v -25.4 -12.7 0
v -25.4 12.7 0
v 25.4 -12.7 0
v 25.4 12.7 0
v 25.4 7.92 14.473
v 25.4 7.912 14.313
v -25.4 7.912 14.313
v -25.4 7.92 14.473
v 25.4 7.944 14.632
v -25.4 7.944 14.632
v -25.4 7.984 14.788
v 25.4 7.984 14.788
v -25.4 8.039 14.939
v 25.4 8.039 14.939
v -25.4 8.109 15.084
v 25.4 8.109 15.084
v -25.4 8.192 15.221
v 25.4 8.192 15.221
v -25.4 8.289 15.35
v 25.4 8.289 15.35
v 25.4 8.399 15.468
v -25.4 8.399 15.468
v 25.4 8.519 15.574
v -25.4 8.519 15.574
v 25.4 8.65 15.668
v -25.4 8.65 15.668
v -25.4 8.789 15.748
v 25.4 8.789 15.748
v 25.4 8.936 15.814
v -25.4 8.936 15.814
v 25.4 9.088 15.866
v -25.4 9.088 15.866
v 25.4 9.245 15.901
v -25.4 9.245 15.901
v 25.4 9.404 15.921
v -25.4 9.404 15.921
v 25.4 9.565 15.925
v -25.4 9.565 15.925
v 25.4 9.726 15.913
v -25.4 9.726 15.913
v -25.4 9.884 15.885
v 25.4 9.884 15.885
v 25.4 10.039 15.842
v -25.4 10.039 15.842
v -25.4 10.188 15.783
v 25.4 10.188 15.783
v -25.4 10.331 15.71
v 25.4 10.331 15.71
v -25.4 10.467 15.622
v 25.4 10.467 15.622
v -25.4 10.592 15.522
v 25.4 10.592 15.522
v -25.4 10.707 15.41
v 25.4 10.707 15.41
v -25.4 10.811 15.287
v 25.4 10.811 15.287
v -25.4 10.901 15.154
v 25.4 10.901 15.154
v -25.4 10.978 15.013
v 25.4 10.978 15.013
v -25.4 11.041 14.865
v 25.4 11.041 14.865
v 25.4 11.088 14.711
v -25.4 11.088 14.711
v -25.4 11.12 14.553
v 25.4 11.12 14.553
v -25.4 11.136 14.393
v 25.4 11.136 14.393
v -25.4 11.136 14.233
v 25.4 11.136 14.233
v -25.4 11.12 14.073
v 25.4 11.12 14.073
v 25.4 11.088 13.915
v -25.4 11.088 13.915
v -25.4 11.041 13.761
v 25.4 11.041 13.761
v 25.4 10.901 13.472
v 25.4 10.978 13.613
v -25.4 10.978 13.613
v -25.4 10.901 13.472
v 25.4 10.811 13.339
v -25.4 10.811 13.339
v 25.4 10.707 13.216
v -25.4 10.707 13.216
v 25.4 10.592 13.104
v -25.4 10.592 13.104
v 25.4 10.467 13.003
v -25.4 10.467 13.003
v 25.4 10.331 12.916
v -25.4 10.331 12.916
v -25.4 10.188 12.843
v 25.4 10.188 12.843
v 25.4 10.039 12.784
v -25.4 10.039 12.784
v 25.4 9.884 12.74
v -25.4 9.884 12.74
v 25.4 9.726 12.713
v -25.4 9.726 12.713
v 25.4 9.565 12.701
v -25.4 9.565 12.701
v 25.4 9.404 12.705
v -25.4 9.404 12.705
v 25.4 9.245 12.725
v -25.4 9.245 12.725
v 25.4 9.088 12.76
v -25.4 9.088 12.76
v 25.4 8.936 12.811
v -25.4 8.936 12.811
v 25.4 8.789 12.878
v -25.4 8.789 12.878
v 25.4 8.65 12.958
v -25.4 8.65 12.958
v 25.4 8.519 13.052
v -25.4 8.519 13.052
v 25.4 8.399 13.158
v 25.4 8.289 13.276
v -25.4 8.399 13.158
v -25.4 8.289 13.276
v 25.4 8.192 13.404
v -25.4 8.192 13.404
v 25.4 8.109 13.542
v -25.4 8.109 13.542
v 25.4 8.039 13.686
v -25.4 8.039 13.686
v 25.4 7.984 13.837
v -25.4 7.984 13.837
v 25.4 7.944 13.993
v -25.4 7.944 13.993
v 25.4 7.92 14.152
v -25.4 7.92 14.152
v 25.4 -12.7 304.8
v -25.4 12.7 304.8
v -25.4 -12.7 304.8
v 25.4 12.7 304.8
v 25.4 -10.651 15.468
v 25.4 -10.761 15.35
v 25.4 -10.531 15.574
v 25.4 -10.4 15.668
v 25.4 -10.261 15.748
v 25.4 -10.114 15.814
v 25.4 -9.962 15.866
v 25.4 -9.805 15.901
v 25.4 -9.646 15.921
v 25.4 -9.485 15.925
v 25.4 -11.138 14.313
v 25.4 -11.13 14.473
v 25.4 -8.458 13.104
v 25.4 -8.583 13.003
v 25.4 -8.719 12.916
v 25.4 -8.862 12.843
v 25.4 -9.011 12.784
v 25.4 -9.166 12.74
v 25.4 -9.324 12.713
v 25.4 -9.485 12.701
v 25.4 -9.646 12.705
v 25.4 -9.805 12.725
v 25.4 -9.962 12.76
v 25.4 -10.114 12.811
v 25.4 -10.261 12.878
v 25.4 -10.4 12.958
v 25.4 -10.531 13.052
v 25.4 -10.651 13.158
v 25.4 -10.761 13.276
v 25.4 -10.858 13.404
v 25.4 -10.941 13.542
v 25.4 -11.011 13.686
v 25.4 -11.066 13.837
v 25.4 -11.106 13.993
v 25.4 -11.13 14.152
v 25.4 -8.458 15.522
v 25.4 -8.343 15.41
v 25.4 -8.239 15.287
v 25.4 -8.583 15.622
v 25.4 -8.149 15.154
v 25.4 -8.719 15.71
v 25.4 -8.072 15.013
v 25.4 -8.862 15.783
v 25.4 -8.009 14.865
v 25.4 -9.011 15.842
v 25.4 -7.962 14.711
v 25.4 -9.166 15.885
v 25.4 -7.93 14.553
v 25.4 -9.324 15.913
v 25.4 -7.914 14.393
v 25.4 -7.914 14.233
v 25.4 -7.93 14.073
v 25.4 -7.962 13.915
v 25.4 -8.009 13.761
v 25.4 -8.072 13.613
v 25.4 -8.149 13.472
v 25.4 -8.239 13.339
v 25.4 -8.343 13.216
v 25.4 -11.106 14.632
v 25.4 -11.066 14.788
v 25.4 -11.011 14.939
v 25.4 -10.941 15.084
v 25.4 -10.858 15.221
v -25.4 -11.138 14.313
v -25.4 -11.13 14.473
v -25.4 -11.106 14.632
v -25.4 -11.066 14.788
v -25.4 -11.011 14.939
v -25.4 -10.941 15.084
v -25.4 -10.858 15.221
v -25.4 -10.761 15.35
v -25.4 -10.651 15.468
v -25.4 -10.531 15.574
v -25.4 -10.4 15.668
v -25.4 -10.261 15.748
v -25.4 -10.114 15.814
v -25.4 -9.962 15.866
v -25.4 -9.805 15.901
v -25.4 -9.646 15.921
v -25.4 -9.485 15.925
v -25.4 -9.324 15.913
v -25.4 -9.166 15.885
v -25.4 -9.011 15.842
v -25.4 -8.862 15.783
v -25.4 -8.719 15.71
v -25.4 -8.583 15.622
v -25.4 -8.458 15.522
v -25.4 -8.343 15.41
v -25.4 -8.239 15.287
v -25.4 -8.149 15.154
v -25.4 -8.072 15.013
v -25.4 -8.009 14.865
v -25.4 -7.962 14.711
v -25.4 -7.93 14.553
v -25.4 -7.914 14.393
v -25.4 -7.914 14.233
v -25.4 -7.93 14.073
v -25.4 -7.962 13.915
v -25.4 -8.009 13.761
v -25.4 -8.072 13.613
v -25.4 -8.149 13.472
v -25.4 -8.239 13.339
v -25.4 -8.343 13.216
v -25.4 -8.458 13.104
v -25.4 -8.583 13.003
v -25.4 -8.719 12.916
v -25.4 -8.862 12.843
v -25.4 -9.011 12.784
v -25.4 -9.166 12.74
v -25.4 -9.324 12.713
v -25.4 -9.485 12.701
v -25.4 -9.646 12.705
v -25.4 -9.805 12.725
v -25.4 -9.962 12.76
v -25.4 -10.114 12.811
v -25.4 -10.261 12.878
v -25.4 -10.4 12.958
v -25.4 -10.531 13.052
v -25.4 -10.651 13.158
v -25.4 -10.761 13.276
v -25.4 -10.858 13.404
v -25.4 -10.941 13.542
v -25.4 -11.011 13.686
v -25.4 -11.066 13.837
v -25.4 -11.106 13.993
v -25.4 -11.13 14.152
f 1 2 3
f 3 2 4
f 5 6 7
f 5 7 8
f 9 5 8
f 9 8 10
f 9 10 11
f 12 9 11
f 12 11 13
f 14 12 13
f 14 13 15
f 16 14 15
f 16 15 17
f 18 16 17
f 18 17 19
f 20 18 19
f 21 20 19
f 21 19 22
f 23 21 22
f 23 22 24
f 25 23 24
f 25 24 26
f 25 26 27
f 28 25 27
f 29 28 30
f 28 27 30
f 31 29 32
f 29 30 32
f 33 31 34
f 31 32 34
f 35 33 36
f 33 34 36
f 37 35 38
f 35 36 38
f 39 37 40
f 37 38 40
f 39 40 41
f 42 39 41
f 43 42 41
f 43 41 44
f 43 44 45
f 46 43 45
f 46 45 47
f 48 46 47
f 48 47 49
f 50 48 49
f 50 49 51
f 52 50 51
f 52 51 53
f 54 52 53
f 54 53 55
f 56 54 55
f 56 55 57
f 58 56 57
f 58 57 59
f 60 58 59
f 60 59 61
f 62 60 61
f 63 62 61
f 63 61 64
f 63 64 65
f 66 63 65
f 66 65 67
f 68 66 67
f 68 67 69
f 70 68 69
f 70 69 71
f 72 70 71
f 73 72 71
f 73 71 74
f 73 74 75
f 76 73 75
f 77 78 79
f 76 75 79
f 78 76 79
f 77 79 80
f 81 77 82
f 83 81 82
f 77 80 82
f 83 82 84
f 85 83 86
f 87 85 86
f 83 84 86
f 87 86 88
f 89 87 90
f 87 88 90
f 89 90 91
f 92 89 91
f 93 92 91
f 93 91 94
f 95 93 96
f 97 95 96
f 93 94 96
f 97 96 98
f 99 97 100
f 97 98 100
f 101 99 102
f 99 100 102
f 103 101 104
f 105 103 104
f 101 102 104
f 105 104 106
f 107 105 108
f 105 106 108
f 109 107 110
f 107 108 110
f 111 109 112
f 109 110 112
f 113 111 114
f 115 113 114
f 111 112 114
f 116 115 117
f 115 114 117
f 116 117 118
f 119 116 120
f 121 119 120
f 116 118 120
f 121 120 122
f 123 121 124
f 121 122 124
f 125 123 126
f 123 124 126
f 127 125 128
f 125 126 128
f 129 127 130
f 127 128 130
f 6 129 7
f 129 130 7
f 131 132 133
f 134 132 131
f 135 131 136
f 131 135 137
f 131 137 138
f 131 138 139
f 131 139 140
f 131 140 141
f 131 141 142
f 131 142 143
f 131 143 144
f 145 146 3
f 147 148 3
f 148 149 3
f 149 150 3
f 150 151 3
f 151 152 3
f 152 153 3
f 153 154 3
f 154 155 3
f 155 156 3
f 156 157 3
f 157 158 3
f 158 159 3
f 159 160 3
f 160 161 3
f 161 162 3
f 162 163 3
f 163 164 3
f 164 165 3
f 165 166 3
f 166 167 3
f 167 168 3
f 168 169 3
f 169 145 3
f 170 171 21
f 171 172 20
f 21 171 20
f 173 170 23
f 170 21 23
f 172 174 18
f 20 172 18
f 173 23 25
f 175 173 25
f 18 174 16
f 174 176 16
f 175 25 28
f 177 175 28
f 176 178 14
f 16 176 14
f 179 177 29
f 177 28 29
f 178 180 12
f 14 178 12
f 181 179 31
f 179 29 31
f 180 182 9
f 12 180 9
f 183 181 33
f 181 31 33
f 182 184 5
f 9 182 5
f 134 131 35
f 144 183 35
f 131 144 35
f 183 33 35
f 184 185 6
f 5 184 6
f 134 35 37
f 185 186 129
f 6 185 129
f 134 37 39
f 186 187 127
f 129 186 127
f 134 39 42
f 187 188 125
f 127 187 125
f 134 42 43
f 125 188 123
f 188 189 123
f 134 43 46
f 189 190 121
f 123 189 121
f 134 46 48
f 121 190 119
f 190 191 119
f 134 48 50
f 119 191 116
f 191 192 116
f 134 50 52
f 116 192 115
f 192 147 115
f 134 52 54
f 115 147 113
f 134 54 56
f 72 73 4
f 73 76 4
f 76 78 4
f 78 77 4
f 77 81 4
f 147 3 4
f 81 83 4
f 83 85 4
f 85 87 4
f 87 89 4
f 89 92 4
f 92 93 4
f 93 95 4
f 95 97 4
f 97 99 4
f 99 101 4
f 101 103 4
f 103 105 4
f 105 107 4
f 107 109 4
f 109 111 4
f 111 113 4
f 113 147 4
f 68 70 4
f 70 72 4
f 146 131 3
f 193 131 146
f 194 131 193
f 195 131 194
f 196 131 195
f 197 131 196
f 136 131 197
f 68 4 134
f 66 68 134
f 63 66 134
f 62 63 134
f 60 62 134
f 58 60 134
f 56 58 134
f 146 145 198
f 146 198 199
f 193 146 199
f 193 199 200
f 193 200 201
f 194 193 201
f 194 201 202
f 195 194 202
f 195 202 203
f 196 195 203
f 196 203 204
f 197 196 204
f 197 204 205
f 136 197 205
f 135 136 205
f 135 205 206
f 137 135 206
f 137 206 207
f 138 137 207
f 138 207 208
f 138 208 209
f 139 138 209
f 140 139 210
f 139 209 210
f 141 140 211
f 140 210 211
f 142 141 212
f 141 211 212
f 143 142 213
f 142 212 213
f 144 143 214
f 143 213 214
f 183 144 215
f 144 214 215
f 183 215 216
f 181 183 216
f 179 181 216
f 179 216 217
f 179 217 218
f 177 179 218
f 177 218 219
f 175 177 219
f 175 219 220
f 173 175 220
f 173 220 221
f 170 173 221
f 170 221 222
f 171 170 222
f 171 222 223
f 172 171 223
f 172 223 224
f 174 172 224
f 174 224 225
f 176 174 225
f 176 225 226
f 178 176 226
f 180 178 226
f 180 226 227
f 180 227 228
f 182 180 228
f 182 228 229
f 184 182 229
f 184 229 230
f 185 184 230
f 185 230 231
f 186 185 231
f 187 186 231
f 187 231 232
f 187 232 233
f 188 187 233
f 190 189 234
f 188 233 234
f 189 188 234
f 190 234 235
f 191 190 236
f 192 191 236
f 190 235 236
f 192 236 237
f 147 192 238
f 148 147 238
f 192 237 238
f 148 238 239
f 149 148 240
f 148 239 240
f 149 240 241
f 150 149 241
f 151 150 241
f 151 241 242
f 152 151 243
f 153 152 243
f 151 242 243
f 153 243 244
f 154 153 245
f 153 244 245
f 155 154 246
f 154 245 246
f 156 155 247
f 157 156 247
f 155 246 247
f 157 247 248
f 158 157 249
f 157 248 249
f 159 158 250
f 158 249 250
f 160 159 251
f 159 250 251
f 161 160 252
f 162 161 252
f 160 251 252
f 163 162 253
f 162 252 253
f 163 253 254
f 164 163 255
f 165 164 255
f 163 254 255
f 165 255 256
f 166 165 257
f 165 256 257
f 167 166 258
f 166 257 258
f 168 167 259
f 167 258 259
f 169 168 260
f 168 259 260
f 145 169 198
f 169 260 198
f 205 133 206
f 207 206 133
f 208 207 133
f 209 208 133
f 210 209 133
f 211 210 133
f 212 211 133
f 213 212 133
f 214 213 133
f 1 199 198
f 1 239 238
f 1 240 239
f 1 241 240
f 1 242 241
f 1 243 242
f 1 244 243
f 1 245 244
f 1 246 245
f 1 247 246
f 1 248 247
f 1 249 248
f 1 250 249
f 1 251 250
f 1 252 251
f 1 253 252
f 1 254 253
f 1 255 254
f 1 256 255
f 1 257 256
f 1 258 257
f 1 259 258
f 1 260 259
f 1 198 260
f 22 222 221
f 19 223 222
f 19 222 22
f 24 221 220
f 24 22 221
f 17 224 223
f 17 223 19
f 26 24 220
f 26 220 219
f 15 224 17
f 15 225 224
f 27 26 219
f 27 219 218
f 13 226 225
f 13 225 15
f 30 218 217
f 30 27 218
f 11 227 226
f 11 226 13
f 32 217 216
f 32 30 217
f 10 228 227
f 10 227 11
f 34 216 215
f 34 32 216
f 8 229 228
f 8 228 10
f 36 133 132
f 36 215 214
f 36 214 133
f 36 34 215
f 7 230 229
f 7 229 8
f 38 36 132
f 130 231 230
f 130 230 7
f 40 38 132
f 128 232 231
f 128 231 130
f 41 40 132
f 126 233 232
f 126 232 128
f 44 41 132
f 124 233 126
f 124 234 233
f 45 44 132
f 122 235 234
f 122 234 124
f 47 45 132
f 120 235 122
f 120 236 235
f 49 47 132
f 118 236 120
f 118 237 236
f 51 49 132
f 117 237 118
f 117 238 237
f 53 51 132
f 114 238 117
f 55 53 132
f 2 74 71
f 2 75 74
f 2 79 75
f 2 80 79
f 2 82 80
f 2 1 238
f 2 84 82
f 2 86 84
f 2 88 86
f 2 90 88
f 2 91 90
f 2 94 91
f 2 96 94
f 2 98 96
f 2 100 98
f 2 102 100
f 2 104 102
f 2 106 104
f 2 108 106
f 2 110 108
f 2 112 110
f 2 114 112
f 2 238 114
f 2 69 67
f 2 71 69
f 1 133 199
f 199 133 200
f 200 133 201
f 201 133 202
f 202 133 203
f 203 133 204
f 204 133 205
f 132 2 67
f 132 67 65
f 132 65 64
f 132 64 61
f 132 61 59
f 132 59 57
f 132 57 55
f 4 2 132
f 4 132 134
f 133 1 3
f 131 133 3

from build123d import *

# Parameters (mm, degrees)
F0_W     = 50.8
F0_H     = 25.4
F1_DEPTH = 304.8
F3_D     = 3.2258


with BuildPart() as f1:
    # F0 (on Top) → F1 (new body)
    with BuildSketch(Plane.XY):
        Rectangle(F0_W, F0_H)
    extrude(amount=F1_DEPTH)

    # F3 (through all)
    with Locations(Plane.YZ.offset(25.4)):
        with Locations((9.525, 14.3129), (-9.525, 14.3129)):
            Hole(F3_D / 2)


solid = f1.part
